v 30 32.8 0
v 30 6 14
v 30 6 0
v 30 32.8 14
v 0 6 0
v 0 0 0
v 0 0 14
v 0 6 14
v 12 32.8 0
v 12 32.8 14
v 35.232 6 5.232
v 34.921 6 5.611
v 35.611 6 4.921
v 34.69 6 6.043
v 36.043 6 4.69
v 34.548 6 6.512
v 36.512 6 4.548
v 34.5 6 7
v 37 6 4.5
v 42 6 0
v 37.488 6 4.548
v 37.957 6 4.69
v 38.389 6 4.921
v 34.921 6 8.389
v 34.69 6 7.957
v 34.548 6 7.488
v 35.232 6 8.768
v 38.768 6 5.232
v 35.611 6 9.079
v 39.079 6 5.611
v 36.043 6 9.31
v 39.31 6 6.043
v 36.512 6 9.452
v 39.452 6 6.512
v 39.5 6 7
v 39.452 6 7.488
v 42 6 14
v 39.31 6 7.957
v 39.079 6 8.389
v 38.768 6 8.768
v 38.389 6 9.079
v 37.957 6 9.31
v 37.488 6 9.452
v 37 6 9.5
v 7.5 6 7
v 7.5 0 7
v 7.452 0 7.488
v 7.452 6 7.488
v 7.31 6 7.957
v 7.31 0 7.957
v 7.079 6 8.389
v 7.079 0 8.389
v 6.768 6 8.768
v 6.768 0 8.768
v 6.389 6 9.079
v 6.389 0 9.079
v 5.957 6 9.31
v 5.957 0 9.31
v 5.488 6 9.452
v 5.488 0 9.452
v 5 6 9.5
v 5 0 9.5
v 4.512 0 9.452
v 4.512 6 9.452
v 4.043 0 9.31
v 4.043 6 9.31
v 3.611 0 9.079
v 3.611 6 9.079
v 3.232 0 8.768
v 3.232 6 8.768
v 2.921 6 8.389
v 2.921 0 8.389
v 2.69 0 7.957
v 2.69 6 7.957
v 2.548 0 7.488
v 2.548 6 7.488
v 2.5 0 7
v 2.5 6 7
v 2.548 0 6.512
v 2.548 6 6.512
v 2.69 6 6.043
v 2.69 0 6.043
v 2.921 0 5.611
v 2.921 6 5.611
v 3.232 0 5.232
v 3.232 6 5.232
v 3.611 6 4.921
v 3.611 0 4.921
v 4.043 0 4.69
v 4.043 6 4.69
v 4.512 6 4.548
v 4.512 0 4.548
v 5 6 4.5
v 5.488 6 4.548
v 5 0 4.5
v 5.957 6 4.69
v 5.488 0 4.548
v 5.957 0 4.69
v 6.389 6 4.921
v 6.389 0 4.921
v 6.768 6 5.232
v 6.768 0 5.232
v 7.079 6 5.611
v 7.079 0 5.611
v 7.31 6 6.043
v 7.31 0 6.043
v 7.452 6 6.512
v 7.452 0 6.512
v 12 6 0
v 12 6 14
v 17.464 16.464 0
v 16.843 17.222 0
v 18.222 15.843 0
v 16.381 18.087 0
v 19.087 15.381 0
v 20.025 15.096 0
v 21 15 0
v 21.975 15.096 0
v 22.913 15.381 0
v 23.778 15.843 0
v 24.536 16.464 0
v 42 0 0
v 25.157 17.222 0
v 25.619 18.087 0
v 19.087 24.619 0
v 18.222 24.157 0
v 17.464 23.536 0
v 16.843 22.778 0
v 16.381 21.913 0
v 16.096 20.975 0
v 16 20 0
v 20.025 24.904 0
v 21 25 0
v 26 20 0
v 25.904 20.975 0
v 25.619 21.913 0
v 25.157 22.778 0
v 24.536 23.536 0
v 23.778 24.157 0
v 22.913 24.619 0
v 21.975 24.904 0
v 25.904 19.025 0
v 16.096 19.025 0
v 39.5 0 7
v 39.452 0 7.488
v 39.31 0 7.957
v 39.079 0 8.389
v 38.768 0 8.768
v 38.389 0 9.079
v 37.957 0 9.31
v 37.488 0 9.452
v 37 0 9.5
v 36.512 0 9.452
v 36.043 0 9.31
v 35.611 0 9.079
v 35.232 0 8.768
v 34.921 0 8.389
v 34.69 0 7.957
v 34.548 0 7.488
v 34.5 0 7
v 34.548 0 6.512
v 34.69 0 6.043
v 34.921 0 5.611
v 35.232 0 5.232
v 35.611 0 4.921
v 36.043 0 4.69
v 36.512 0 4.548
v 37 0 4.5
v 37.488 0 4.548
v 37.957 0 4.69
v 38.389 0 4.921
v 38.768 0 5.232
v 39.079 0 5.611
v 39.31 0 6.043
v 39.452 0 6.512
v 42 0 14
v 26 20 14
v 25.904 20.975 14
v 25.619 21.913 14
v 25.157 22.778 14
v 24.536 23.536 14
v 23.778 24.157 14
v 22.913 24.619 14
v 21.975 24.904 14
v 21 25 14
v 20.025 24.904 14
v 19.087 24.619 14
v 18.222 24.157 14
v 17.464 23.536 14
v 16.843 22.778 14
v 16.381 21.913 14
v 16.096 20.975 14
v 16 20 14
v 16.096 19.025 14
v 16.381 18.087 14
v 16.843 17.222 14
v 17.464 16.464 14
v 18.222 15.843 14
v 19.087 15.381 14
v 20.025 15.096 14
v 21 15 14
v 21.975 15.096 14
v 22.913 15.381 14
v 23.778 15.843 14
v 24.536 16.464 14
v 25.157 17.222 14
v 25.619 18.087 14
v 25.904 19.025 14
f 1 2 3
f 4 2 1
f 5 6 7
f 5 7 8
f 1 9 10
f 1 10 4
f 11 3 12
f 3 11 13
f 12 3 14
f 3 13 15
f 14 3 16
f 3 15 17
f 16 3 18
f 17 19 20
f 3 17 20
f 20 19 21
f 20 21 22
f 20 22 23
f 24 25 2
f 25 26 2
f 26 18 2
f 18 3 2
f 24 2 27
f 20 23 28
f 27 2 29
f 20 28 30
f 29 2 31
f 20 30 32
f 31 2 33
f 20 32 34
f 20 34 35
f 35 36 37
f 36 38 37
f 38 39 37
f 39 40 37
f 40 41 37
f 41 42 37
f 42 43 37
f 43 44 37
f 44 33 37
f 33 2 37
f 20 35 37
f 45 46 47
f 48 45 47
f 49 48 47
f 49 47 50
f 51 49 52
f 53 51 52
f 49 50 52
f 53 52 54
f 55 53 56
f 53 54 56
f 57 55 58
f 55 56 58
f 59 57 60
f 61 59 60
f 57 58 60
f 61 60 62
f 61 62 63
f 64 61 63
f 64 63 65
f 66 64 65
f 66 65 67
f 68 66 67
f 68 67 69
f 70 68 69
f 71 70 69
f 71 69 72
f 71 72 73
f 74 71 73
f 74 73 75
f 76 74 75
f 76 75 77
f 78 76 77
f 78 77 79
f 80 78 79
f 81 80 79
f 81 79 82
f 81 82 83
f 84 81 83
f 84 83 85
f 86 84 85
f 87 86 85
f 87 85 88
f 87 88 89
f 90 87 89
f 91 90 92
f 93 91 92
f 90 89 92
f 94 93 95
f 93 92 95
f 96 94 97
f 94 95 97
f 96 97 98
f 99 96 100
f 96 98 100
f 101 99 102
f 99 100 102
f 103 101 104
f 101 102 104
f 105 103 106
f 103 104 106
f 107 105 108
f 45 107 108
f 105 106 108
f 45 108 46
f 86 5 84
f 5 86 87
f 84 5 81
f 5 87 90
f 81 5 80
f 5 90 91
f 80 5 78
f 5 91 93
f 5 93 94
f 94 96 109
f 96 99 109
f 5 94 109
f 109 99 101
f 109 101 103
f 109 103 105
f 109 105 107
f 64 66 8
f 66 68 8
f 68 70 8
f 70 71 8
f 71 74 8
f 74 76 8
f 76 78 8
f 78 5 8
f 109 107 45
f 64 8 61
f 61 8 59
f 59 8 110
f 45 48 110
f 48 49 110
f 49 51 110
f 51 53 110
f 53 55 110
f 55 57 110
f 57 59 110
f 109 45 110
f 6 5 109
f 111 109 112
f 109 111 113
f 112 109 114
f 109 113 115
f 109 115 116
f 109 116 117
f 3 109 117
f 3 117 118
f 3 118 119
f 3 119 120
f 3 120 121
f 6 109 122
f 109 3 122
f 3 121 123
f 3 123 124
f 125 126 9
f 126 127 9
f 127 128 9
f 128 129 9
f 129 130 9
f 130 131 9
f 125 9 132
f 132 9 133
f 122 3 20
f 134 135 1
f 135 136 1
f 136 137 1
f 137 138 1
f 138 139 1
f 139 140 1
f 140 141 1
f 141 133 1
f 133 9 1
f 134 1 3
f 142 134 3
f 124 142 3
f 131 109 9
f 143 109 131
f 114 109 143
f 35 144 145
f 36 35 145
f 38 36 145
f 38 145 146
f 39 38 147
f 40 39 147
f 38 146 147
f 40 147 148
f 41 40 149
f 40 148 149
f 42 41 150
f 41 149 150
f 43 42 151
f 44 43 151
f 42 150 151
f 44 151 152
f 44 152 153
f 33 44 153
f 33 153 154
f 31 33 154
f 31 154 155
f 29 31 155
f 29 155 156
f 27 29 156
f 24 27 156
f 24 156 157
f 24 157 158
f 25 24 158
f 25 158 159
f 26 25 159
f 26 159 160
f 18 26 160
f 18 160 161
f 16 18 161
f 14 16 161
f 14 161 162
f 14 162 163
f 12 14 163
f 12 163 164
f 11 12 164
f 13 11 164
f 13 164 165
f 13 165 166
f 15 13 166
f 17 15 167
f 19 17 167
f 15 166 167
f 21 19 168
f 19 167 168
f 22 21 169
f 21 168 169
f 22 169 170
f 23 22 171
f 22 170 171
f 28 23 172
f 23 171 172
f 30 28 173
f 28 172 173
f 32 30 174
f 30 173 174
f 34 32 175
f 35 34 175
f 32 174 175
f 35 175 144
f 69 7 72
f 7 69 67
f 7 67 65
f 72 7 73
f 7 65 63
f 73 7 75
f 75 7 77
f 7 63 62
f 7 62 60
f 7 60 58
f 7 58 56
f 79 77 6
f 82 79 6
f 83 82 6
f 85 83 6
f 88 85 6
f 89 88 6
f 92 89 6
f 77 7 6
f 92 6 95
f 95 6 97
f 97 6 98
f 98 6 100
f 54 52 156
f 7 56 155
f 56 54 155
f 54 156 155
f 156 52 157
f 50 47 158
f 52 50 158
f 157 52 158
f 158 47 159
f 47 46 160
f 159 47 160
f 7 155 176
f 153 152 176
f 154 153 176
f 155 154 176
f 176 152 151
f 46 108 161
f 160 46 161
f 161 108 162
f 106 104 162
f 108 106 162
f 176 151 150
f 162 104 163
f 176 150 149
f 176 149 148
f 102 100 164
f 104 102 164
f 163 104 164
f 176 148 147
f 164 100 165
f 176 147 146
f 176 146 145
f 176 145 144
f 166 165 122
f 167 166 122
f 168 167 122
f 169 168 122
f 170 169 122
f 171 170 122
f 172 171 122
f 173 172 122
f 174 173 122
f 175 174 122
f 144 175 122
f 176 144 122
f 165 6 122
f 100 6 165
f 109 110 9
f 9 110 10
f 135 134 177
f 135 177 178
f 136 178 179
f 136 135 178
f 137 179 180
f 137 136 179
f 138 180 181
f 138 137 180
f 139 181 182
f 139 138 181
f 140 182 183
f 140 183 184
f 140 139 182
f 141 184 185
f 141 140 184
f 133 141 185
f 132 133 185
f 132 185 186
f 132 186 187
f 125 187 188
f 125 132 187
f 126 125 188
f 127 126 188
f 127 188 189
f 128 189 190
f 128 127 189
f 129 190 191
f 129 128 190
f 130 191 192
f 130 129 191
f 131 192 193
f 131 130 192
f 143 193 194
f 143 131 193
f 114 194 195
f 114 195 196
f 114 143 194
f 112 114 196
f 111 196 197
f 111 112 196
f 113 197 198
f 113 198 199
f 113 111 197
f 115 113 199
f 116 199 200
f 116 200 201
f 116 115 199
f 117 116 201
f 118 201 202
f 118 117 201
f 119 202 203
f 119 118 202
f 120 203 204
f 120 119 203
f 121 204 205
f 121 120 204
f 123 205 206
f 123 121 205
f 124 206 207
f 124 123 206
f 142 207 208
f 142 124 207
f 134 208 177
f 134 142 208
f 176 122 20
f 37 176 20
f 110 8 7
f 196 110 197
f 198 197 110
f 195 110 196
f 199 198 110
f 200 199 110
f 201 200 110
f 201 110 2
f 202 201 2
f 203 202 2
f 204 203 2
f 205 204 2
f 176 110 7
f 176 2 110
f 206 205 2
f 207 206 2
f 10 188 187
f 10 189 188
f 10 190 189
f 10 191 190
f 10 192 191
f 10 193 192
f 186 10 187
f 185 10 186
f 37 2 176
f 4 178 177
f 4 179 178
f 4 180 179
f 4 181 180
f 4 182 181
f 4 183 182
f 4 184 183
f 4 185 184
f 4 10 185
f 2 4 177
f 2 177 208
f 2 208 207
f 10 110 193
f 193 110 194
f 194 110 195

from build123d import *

# Parameters (mm, degrees)
F0_W     = 42
F0_H     = 32.8
F0_R     = 5
F1_DEPTH = 14
F2_W     = 12
F2_H     = 26.8
F3_DEPTH = 14
F4_R     = 2.5
F5_DEPTH = 25.4


with BuildPart() as f1:
    # F0 (on Top) → F1 (new body)
    with BuildSketch(Plane.XY):
        with Locations((21, 16.4)):
            Rectangle(F0_W, F0_H)
        with Locations((21, 20)):
            Circle(F0_R, mode=Mode.SUBTRACT)
    extrude(amount=F1_DEPTH)

    # F2 (on face) → F3 (cut)
    with BuildSketch(Plane.XY.offset(14)):
        with Locations((6, 19.4)):
            Rectangle(F2_W, F2_H)
        with Locations((36, 19.4)):
            Rectangle(F2_W, F2_H)
    extrude(amount=-F3_DEPTH, mode=Mode.SUBTRACT)

    # F4 (on face) → F5 (cut)
    with BuildSketch(Plane.XZ):
        with Locations((5, 7)):
            Circle(F4_R)
        with Locations((37, 7)):
            Circle(F4_R)
    extrude(amount=-F5_DEPTH, mode=Mode.SUBTRACT)


solid = f1.part
